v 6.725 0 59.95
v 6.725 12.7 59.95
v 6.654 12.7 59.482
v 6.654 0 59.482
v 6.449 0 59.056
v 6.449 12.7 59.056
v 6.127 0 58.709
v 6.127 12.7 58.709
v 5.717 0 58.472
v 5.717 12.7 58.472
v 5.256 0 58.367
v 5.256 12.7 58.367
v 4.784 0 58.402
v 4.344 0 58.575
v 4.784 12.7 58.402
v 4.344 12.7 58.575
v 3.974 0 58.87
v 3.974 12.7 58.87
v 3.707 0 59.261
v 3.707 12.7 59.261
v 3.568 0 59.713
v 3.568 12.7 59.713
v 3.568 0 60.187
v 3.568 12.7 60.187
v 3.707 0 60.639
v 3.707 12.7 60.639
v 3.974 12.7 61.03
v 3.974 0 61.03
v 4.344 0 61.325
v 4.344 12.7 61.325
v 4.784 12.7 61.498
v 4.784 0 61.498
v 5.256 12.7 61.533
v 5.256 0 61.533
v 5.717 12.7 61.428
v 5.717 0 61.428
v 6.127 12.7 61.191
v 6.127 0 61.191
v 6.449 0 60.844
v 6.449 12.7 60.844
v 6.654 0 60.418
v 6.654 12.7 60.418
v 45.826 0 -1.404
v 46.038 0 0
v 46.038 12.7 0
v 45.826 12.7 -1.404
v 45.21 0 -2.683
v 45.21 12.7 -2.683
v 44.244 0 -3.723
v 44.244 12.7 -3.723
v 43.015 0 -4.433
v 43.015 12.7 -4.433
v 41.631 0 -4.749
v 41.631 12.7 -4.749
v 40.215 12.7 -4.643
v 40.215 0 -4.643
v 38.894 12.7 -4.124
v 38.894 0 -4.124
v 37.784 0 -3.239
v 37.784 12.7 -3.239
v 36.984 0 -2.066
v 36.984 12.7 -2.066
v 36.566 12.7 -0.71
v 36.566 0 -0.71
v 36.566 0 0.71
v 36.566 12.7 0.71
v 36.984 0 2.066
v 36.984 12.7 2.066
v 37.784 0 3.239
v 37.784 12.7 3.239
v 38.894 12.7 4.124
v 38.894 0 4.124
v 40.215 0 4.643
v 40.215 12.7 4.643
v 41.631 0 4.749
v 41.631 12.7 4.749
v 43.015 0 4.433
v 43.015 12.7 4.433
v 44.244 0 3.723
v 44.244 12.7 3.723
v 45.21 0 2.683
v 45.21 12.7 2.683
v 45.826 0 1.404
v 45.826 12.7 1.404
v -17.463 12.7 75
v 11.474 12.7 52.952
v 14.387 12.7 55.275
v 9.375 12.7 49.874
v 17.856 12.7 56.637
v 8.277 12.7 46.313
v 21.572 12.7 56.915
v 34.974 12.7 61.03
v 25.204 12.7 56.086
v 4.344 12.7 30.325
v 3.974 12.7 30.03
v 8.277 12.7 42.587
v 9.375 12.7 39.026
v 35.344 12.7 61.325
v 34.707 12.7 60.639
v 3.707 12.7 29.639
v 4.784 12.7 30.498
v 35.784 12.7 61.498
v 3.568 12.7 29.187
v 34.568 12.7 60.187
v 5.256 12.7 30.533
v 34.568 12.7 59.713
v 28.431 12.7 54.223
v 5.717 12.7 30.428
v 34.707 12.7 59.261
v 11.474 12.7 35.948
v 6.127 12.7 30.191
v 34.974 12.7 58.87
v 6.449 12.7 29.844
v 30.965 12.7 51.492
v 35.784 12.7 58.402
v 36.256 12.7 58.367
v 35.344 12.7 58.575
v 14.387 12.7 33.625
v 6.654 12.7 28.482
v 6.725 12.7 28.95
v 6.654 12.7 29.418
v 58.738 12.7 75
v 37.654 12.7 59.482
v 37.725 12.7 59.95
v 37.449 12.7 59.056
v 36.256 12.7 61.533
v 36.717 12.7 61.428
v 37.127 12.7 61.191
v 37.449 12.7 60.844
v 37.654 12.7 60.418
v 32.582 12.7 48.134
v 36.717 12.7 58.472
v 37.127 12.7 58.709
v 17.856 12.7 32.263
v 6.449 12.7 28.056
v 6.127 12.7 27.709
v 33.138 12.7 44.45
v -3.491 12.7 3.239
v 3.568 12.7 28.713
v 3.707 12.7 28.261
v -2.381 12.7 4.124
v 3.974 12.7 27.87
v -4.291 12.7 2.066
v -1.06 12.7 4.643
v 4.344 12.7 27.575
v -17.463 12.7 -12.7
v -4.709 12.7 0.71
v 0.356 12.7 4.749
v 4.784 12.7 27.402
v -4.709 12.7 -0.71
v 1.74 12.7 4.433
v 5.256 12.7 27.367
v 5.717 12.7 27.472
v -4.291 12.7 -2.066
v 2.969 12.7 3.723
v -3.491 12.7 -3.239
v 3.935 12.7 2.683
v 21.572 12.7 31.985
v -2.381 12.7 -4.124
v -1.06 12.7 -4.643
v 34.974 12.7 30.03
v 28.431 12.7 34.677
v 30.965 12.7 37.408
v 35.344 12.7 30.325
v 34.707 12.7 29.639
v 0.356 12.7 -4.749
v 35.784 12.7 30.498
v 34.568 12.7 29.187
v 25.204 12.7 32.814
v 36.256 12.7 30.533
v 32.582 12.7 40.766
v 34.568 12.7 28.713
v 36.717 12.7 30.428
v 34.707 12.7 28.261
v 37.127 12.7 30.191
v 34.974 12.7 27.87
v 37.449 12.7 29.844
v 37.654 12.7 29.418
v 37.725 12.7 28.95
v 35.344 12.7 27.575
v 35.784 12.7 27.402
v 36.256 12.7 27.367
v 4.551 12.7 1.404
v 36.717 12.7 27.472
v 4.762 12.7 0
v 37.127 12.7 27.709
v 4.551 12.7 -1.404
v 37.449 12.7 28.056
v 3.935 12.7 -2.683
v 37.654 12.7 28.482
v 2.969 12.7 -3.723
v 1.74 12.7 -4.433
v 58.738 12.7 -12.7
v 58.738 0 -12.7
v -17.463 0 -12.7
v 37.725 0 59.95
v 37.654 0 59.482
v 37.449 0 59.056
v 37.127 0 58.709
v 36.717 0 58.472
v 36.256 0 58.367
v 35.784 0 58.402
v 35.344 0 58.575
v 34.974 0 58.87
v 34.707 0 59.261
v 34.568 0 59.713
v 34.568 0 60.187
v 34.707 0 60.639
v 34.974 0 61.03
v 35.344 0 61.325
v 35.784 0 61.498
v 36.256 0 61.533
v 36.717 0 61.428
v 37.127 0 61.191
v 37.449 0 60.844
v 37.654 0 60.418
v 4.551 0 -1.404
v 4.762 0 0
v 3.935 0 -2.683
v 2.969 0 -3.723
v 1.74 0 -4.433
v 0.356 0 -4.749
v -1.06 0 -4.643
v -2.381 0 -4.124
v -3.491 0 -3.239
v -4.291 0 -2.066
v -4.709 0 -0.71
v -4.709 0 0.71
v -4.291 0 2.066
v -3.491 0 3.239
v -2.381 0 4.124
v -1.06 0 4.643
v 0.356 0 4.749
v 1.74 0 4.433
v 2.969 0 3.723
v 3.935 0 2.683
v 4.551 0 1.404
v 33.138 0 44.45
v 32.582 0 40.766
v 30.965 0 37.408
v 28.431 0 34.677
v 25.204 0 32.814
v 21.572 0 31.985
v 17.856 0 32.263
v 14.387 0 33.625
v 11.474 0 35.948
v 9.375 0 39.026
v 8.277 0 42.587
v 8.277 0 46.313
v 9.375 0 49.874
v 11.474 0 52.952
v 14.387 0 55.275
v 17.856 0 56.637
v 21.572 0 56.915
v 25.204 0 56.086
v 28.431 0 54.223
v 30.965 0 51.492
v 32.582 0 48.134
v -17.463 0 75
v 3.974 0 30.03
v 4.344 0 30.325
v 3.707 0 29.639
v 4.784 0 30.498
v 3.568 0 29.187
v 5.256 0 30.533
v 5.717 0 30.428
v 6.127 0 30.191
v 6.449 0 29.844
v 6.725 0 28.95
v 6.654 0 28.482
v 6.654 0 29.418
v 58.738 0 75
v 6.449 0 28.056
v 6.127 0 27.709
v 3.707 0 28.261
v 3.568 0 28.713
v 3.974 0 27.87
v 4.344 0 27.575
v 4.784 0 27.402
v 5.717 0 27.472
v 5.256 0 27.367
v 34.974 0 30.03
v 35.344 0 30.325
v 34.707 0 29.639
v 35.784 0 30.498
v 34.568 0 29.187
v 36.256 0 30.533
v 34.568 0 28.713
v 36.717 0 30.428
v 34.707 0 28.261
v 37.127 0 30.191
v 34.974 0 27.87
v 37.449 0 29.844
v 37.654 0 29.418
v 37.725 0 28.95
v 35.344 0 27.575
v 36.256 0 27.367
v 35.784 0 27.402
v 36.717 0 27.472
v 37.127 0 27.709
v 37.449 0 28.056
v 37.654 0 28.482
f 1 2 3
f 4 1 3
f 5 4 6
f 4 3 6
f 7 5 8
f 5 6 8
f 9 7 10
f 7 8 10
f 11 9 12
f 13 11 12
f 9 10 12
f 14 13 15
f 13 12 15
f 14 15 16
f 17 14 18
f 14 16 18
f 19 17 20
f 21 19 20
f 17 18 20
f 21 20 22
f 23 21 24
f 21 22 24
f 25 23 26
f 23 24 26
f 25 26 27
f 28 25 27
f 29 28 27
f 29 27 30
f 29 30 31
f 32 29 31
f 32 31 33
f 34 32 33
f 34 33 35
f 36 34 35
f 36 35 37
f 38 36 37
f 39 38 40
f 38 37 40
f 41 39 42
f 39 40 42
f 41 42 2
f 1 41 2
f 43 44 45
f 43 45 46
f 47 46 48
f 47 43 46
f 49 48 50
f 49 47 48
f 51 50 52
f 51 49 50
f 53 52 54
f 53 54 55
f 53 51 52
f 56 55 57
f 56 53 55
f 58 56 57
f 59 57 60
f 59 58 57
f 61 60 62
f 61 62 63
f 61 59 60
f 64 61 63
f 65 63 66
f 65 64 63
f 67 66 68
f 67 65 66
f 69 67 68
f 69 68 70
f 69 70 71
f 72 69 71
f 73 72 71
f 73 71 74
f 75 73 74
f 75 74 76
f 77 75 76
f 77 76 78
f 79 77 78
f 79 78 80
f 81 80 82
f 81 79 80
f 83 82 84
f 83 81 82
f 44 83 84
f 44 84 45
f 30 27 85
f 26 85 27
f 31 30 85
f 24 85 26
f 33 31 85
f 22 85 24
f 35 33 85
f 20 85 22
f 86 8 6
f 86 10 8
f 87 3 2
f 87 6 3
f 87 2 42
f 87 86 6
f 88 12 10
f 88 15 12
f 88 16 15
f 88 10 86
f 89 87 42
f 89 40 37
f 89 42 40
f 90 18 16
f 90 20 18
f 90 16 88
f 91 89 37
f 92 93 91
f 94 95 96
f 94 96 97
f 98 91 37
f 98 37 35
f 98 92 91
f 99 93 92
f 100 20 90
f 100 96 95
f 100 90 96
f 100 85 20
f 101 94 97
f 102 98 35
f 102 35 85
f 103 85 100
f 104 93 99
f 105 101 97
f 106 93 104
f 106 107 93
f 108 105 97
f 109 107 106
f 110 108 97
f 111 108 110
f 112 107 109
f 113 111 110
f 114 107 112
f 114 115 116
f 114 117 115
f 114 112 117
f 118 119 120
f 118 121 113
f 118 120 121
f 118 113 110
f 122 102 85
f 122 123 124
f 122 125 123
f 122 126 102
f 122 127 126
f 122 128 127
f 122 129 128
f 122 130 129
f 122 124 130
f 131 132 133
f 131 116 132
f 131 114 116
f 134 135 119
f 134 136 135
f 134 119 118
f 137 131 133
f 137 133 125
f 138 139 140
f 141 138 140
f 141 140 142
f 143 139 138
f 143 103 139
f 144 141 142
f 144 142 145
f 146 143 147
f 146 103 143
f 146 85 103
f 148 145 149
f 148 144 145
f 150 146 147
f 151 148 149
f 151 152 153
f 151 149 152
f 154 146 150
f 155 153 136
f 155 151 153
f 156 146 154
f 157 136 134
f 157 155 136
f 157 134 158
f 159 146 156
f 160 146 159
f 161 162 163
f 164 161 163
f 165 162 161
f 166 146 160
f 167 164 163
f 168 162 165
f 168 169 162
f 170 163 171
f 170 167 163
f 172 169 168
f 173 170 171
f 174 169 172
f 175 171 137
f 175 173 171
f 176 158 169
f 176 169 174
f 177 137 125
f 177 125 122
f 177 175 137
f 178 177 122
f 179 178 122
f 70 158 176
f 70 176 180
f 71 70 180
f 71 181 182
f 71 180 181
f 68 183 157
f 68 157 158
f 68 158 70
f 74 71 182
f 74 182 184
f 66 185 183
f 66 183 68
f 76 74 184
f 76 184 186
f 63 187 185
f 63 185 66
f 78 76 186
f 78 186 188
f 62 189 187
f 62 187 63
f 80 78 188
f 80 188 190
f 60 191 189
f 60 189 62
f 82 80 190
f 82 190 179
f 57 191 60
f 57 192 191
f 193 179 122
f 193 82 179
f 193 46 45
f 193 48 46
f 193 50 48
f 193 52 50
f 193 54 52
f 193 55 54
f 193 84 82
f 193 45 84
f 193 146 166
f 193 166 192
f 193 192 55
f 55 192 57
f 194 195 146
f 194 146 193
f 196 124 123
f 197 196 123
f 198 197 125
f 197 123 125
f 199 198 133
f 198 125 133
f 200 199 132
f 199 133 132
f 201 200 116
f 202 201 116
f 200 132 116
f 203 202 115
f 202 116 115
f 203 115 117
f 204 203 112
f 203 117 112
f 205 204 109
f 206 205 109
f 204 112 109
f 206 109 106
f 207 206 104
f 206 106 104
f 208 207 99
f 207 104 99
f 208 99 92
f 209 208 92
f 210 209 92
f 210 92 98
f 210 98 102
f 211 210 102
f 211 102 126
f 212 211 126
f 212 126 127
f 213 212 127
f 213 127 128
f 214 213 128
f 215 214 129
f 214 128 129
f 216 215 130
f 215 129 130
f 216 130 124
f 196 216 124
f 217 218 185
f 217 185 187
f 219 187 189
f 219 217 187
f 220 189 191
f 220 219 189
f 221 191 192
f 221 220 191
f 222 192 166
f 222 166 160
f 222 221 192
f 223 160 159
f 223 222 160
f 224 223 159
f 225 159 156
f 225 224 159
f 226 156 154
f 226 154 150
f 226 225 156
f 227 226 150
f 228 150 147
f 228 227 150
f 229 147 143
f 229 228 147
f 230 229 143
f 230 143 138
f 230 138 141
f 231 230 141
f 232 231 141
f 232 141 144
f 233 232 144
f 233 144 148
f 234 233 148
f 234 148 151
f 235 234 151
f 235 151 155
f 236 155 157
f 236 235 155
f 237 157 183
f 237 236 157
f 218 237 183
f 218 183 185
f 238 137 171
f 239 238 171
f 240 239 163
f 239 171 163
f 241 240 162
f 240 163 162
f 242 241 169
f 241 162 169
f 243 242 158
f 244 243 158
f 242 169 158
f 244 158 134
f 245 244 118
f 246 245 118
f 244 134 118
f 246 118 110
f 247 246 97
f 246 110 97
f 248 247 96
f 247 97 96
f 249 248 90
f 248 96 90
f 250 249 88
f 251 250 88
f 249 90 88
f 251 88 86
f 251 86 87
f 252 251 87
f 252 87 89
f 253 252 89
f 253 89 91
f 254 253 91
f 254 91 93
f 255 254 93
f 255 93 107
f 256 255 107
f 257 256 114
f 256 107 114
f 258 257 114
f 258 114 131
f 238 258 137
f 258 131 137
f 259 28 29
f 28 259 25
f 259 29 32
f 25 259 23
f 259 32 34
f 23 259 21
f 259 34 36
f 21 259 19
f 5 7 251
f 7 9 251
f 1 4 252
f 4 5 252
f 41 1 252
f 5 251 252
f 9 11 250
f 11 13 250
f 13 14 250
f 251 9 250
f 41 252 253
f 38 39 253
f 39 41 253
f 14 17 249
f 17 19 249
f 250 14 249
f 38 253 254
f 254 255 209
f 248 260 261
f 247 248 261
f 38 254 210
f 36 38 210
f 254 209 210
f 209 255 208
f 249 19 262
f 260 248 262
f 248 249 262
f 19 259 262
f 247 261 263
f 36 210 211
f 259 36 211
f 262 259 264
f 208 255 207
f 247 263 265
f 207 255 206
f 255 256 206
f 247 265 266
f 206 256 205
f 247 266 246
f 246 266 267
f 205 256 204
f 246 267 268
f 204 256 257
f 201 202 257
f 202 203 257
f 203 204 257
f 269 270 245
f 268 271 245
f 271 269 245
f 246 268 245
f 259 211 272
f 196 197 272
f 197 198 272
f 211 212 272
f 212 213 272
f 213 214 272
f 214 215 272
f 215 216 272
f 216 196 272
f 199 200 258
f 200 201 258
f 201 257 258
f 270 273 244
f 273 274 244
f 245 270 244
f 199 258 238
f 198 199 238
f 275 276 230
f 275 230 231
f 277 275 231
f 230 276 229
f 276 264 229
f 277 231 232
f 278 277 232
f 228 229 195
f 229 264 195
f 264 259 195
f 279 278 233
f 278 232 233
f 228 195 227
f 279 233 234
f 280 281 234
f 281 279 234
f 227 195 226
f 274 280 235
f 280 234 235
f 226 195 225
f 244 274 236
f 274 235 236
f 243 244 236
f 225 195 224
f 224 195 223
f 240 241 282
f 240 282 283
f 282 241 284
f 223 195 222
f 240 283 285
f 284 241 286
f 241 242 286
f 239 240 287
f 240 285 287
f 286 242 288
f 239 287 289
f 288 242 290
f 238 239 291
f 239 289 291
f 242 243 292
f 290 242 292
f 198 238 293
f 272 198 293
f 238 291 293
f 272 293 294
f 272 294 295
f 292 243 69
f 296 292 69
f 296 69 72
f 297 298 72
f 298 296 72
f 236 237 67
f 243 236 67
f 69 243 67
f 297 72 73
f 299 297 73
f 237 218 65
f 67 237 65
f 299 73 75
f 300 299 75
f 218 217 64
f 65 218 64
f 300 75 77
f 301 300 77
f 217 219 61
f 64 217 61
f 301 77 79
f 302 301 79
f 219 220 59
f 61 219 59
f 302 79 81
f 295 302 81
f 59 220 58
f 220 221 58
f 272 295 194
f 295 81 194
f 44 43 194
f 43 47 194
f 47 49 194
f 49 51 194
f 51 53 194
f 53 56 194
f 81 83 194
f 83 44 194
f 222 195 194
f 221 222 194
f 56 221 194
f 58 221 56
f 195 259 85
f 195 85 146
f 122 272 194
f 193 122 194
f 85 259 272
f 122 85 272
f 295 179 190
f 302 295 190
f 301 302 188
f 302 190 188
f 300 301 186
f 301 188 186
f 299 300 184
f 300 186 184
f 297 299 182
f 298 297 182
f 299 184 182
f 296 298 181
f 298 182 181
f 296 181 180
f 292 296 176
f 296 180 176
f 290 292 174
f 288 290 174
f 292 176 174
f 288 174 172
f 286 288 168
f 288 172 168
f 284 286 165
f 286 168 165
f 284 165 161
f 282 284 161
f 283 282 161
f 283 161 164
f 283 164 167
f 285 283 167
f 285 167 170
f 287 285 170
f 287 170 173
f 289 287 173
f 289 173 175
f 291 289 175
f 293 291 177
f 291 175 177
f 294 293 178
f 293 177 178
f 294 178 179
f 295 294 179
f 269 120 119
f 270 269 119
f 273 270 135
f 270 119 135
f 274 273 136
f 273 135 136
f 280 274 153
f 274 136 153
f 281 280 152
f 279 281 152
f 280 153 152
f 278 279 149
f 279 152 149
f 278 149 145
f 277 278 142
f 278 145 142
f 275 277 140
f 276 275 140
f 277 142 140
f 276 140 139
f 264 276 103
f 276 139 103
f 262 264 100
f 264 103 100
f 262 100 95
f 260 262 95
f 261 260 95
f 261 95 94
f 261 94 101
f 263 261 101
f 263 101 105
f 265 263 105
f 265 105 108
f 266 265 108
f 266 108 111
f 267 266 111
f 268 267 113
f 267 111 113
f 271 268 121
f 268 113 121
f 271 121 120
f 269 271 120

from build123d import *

# Parameters (mm, degrees)
SKETCH1_W           = 76.2
SKETCH1_H           = 87.7
SKETCH1_R           = 4.7625
BOSS_EXTRUDE1_DEPTH = 12.7
SKETCH2_R           = 12.5
SKETCH2_R_2         = 1.5875
CUT_EXTRUDE1_DEPTH  = 12.7


with BuildPart() as part:
    # Sketch1 → Boss-Extrude1 (new body)
    with BuildSketch(Plane(origin=(0, 0, 0), x_dir=(1, 0, 0), z_dir=(0, 1, 0))):
        with Locations((20.6375, -31.15)):
            Rectangle(SKETCH1_W, SKETCH1_H)
        Circle(SKETCH1_R, mode=Mode.SUBTRACT)
        with Locations((41.275, 0)):
            Circle(SKETCH1_R, mode=Mode.SUBTRACT)
    extrude(amount=BOSS_EXTRUDE1_DEPTH)

    # Sketch2 → Cut-Extrude1 (cut)
    with BuildSketch(Plane(origin=(0, 12.7, 0), x_dir=(1, 0, 0), z_dir=(0, 1, 0))):
        with Locations((20.6375, -44.45)):
            Circle(SKETCH2_R)
        with Locations((36.1375, -28.95)):
            Circle(SKETCH2_R_2)
        with Locations((5.1375, -28.95)):
            Circle(SKETCH2_R_2)
        with Locations((36.1375, -59.95)):
            Circle(SKETCH2_R_2)
        with Locations((5.1375, -59.95)):
            Circle(SKETCH2_R_2)
    extrude(amount=-CUT_EXTRUDE1_DEPTH, mode=Mode.SUBTRACT)


solid = part.part
